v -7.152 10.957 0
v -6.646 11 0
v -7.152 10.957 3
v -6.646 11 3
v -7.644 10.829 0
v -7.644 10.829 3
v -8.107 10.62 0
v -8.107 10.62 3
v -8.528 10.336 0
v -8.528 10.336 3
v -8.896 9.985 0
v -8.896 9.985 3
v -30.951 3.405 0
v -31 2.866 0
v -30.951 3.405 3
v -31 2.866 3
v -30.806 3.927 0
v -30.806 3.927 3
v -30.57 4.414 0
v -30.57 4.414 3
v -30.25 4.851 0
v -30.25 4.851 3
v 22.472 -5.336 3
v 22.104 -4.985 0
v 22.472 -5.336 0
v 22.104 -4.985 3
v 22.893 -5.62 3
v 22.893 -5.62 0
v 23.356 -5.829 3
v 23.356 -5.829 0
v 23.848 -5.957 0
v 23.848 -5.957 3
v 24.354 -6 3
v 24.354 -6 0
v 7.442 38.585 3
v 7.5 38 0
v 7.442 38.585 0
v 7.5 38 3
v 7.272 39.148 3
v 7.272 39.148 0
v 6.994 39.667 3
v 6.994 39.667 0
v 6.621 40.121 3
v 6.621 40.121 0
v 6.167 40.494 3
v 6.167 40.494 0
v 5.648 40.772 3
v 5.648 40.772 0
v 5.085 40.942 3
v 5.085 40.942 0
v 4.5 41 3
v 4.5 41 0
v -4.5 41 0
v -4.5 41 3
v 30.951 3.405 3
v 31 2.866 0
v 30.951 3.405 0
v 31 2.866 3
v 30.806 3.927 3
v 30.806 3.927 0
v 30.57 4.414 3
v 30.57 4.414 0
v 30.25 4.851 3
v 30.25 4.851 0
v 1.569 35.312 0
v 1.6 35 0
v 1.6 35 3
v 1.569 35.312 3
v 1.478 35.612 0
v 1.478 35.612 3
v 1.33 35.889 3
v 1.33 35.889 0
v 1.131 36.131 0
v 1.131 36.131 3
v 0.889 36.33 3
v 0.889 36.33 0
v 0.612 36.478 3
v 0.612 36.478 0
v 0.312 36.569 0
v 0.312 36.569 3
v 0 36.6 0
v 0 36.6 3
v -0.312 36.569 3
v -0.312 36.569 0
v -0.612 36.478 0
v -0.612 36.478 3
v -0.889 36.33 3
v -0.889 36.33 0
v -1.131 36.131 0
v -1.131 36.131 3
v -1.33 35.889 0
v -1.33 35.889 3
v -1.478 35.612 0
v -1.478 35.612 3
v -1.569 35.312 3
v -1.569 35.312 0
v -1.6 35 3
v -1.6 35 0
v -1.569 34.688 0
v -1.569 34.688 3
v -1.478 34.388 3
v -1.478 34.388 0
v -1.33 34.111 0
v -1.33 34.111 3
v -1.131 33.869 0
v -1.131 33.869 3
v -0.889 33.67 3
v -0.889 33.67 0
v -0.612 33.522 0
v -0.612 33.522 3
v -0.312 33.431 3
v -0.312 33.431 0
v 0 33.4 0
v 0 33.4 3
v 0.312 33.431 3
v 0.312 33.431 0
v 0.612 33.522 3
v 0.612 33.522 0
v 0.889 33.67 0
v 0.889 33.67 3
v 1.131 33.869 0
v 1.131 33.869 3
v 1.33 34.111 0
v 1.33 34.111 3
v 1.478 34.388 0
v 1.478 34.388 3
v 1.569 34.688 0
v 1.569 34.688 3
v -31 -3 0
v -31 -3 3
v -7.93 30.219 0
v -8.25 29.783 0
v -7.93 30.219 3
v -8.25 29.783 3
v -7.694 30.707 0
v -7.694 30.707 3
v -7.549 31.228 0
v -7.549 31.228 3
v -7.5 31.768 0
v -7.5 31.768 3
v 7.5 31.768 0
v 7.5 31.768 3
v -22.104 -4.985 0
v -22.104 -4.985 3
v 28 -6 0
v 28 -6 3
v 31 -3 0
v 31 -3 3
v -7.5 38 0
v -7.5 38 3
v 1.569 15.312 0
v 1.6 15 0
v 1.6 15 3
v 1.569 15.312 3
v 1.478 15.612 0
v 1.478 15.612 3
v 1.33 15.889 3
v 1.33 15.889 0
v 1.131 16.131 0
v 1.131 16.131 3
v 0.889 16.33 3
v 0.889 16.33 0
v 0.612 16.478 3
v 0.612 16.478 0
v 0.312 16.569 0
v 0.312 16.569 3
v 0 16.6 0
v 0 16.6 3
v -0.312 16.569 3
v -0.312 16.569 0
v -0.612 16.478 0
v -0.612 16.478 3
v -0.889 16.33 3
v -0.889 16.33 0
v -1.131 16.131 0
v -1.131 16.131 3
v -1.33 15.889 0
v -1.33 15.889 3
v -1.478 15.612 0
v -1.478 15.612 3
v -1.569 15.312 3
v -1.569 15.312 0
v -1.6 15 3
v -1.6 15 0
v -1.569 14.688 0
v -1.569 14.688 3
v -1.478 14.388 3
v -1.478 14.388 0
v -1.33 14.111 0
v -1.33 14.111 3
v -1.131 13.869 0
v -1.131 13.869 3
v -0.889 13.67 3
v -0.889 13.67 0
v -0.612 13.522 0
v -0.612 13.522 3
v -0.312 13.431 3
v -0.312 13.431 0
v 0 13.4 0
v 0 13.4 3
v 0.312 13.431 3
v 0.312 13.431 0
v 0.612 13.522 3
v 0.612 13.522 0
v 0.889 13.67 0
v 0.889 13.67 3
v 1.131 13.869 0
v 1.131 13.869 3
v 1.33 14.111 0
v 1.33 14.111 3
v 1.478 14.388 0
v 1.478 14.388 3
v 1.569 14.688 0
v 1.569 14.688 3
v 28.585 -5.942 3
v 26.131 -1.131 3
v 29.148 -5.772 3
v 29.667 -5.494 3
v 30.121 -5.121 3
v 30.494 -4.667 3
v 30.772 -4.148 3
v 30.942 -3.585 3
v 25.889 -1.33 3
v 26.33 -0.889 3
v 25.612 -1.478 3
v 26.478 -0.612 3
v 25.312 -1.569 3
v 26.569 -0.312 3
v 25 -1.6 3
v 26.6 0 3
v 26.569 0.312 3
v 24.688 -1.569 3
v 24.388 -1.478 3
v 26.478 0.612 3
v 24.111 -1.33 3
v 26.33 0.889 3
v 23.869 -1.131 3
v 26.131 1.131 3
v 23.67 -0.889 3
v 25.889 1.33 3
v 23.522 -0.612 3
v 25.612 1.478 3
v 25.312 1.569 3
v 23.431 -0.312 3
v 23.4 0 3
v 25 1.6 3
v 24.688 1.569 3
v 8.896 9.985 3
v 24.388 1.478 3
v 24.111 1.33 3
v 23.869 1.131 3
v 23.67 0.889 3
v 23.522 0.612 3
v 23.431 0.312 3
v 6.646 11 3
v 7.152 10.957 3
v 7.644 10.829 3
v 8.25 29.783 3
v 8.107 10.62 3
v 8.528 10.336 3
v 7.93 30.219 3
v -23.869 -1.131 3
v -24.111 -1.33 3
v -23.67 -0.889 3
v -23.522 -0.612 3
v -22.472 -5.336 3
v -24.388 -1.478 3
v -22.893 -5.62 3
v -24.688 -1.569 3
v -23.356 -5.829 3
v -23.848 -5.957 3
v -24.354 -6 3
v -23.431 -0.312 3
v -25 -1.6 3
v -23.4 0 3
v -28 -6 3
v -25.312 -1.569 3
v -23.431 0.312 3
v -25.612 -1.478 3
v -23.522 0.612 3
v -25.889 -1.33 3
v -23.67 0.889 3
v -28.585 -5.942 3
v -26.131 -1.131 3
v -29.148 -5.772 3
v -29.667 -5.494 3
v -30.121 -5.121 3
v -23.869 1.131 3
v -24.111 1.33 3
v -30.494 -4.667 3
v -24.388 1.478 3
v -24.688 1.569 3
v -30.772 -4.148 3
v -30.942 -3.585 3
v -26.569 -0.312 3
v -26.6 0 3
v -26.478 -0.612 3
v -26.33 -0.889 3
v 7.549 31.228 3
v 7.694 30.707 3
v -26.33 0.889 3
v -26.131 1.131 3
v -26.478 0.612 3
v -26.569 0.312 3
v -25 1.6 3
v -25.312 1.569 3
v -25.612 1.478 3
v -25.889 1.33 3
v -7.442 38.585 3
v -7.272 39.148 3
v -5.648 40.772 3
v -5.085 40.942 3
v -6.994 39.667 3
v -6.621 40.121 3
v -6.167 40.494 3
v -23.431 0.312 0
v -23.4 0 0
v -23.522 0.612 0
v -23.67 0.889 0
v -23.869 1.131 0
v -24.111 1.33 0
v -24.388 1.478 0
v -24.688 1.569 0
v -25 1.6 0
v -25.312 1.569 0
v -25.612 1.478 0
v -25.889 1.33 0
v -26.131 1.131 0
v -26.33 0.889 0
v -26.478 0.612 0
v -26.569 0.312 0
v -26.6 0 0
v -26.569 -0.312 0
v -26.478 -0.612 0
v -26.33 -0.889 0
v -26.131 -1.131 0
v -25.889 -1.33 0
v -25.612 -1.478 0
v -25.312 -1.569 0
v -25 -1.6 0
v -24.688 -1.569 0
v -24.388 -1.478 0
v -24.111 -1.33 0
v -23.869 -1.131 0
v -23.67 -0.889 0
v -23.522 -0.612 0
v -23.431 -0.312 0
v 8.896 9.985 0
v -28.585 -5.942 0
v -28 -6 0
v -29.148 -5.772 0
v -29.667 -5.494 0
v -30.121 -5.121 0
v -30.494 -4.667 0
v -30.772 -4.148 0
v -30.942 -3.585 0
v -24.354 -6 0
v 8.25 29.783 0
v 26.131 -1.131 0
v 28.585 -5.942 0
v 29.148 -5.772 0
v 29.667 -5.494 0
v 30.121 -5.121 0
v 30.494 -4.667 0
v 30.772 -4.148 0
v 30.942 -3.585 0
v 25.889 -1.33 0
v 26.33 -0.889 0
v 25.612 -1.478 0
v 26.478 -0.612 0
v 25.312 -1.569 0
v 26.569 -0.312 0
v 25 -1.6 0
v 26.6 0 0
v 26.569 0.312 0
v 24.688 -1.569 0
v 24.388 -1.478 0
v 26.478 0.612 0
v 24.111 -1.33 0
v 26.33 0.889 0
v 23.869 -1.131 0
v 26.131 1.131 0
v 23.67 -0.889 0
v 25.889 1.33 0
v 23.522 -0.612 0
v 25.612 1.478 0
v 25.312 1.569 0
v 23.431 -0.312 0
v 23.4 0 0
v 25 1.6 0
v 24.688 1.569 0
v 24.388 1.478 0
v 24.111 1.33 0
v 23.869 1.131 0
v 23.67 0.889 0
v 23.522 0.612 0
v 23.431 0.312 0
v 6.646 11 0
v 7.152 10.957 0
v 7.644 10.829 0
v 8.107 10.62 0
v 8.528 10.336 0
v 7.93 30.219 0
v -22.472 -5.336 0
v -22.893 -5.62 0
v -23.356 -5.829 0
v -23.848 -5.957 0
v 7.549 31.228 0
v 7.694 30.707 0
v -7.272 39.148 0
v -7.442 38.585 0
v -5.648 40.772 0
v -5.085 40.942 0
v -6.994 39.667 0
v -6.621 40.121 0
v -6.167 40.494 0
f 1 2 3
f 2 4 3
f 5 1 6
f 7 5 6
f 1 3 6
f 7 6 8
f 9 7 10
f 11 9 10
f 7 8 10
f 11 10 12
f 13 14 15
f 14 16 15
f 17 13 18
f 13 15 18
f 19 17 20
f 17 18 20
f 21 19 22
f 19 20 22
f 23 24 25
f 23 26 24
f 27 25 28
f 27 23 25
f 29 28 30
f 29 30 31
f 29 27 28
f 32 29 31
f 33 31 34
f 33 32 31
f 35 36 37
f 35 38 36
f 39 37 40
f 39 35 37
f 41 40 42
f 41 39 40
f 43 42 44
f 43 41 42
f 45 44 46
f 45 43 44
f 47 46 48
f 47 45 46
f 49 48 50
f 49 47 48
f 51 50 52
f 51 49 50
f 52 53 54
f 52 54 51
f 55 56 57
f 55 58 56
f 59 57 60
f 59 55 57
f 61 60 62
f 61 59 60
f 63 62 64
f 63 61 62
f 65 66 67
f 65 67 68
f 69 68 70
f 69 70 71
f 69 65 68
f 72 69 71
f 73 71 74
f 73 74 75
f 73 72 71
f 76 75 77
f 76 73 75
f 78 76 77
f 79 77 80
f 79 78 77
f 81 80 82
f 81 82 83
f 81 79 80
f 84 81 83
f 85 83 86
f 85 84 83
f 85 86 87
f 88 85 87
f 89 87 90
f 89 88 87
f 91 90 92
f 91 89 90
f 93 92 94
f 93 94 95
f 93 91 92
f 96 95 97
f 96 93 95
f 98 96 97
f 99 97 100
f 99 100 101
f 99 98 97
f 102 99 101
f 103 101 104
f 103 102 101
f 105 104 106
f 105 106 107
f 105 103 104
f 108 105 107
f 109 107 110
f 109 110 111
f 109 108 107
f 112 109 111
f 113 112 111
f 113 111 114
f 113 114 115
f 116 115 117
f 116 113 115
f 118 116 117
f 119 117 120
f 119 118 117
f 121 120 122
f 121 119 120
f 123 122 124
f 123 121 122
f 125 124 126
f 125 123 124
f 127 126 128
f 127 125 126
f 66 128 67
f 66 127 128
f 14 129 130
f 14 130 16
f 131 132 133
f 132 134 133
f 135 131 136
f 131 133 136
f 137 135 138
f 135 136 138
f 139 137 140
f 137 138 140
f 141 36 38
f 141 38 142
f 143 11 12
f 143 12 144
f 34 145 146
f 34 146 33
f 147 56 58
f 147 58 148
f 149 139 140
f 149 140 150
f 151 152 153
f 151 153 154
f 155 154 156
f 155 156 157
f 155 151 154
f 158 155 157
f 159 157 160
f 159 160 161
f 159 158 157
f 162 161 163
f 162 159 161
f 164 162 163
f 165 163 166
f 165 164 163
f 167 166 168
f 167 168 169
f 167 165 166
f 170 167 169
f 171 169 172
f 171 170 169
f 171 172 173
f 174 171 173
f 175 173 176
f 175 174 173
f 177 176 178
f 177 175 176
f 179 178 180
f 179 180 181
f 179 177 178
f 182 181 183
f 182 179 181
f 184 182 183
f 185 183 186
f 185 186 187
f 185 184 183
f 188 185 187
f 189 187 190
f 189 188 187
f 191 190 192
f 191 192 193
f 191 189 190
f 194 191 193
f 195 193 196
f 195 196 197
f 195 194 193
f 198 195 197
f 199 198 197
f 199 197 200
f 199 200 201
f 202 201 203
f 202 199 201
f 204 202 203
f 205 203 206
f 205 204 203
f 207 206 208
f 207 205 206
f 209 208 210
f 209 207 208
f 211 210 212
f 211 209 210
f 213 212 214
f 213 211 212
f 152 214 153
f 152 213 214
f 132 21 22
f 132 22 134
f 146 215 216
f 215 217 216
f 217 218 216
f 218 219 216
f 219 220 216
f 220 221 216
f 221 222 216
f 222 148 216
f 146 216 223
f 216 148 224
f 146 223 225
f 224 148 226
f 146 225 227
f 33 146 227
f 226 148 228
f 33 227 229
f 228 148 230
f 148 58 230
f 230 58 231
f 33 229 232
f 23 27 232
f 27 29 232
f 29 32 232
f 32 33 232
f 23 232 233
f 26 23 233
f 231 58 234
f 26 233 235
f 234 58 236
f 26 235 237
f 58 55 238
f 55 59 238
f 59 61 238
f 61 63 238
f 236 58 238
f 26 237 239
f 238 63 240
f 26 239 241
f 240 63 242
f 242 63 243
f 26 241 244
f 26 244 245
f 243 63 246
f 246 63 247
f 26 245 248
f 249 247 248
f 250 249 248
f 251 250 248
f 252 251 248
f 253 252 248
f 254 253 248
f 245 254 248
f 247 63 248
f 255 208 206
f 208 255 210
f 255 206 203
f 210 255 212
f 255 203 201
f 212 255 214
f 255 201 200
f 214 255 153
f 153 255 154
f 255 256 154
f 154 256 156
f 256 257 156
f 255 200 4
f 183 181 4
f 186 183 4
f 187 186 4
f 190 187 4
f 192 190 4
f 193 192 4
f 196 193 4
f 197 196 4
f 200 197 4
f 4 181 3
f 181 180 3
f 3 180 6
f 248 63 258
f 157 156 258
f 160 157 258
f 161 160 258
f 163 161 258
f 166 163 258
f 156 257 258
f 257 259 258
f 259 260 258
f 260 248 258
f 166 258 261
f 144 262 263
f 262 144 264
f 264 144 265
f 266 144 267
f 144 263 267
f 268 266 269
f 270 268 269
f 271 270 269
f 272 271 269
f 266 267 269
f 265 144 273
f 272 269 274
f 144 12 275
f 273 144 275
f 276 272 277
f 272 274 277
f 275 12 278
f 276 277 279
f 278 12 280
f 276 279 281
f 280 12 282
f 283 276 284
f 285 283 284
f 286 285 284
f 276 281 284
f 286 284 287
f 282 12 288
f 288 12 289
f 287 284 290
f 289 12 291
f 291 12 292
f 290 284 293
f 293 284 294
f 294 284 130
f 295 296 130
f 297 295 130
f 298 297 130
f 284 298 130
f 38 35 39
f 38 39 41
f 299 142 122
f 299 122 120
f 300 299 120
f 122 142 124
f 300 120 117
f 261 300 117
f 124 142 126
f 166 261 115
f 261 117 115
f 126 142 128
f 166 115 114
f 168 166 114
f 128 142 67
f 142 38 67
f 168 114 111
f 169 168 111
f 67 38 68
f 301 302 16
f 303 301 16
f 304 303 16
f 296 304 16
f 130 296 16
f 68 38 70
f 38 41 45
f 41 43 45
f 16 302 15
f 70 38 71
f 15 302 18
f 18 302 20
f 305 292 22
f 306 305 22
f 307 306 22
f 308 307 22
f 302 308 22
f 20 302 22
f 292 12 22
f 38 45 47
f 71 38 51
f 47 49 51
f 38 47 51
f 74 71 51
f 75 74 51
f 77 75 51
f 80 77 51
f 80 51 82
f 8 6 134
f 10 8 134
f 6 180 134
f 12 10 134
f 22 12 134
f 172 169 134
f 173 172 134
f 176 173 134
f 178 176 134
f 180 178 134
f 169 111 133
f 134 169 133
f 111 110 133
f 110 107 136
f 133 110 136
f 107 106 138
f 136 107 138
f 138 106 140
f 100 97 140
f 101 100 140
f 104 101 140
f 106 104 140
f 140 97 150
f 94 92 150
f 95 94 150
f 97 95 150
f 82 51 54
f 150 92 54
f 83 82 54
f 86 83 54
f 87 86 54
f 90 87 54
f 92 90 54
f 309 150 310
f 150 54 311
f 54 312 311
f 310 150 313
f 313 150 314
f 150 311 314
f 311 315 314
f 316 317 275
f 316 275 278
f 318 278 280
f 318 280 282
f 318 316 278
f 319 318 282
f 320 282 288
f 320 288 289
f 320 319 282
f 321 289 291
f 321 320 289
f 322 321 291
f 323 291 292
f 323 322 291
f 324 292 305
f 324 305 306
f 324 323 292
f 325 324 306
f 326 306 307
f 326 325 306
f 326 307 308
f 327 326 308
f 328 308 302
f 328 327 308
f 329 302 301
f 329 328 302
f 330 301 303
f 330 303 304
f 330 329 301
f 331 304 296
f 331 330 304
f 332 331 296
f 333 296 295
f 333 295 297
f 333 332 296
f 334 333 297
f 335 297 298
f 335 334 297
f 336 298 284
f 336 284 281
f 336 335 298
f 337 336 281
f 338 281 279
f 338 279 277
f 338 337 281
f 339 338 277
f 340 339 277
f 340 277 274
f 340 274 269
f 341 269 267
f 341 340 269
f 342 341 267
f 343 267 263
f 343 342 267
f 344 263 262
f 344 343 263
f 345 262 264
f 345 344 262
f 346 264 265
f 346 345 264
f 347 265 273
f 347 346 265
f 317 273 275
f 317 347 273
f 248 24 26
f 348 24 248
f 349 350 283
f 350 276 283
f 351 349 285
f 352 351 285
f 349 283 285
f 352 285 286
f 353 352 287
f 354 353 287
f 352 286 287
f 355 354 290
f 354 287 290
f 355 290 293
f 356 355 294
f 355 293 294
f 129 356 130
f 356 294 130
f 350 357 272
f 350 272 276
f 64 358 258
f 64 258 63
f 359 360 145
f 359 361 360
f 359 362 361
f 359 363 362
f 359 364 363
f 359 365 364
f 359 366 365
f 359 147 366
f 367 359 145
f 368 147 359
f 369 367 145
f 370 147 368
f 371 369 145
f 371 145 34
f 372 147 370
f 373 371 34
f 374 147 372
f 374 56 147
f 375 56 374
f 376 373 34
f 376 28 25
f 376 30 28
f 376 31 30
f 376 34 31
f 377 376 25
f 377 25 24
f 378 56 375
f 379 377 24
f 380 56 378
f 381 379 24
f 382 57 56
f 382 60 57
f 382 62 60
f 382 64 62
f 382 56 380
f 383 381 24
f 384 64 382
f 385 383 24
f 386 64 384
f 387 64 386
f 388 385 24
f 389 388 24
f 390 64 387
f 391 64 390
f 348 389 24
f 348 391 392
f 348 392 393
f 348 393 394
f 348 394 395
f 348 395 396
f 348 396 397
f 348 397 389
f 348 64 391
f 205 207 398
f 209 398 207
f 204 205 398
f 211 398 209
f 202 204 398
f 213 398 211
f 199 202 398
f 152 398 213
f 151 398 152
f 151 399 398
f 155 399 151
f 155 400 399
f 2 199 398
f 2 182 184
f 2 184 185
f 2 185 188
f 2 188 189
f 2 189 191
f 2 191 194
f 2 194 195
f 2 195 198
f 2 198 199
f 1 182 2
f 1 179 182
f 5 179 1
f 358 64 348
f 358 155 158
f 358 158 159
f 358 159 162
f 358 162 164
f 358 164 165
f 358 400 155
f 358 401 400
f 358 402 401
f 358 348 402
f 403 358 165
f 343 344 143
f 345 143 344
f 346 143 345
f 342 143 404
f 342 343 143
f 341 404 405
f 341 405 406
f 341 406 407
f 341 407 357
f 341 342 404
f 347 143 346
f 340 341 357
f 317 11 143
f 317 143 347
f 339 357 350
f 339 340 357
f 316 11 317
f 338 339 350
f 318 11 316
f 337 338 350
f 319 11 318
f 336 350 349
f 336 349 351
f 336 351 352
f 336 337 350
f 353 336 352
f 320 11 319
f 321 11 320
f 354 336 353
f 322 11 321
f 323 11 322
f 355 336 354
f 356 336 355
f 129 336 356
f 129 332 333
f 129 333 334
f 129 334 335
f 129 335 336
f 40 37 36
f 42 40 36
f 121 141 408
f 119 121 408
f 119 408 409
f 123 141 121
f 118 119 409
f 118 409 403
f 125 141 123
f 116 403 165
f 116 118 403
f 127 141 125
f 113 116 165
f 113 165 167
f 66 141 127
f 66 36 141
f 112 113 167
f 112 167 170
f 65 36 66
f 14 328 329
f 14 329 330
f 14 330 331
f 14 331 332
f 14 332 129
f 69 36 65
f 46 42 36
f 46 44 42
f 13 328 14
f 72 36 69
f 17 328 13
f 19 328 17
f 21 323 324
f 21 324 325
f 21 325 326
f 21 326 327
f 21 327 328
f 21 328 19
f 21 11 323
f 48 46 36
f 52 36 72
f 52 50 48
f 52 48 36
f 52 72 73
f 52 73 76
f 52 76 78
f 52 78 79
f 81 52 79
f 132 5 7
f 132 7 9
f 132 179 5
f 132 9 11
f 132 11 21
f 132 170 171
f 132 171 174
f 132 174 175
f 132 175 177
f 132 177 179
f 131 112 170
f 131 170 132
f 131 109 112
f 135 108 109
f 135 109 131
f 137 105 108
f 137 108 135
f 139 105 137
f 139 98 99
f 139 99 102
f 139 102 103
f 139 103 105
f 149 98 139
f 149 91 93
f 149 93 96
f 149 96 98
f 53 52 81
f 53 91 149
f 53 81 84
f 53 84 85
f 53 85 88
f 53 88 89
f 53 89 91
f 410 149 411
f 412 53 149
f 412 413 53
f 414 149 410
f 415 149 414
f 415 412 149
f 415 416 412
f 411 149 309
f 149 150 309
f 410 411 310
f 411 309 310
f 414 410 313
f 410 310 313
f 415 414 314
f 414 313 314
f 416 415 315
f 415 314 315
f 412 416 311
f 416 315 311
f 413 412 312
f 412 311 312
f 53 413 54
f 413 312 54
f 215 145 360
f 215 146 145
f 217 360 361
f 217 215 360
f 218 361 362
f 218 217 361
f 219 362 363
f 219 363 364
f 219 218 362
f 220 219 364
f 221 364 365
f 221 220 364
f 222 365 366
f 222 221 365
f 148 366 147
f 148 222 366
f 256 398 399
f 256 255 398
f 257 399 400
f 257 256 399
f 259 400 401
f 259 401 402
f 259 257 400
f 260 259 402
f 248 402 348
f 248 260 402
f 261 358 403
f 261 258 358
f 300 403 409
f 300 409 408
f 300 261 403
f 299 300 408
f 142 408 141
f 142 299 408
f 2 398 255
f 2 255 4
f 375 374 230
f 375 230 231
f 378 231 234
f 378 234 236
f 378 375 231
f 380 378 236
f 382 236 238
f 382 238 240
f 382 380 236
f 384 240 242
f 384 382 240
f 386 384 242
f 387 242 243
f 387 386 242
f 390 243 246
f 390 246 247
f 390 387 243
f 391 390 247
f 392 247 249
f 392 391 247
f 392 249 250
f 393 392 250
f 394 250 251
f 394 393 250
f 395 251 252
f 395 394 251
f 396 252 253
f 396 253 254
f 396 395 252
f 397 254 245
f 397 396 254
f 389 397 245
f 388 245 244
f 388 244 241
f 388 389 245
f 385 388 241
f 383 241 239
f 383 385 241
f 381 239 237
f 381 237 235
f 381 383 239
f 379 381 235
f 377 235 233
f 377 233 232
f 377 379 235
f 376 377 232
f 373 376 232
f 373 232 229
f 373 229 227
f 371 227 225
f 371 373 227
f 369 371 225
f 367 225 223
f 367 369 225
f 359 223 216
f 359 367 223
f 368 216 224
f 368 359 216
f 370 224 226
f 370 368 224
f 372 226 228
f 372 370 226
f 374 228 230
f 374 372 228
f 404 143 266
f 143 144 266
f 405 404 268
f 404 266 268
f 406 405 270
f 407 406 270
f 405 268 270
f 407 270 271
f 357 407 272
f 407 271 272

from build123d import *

# Parameters (mm, degrees)
SKETCH_1_R      = 1.6
EXTRUDE_1_DEPTH = 3
FILLET_1_R      = 3


with BuildPart() as part:
    # 草图1 → 凸台-拉伸1 (new body)
    with BuildSketch(Plane.XY):
        Polygon((8, 11), (-8, 11), (-23, -6), (-31, -6), (-31, 4), (-7.5, 30.633333333), (-7.5, 41), (7.5, 41), (7.5, 30.633333333), (31, 4), (31, -6), (23, -6), align=None)
        with Locations((-25, 0)):
            Circle(SKETCH_1_R, mode=Mode.SUBTRACT)
        with Locations((25, 0)):
            Circle(SKETCH_1_R, mode=Mode.SUBTRACT)
        with Locations((0, 35)):
            Circle(SKETCH_1_R, mode=Mode.SUBTRACT)
        with Locations((0, 15)):
            Circle(SKETCH_1_R, mode=Mode.SUBTRACT)
    extrude(amount=EXTRUDE_1_DEPTH)

    # 圆角1
    fillet_1_edges = [part.edges().sort_by_distance(p)[0] for p in [
        (23, -6, 1.5),
        (8, 11, 1.5),
        (-8, 11, 1.5),
        (-23, -6, 1.5),
        (-31, -6, 1.5),
        (-31, 4, 1.5),
        (-7.5, 30.633333333, 1.5),
        (-7.5, 41, 1.5),
        (7.5, 41, 1.5),
        (7.5, 30.633333333, 1.5),
        (31, 4, 1.5),
        (31, -6, 1.5),
    ]]
    fillet(fillet_1_edges, radius=FILLET_1_R)


solid = part.part
